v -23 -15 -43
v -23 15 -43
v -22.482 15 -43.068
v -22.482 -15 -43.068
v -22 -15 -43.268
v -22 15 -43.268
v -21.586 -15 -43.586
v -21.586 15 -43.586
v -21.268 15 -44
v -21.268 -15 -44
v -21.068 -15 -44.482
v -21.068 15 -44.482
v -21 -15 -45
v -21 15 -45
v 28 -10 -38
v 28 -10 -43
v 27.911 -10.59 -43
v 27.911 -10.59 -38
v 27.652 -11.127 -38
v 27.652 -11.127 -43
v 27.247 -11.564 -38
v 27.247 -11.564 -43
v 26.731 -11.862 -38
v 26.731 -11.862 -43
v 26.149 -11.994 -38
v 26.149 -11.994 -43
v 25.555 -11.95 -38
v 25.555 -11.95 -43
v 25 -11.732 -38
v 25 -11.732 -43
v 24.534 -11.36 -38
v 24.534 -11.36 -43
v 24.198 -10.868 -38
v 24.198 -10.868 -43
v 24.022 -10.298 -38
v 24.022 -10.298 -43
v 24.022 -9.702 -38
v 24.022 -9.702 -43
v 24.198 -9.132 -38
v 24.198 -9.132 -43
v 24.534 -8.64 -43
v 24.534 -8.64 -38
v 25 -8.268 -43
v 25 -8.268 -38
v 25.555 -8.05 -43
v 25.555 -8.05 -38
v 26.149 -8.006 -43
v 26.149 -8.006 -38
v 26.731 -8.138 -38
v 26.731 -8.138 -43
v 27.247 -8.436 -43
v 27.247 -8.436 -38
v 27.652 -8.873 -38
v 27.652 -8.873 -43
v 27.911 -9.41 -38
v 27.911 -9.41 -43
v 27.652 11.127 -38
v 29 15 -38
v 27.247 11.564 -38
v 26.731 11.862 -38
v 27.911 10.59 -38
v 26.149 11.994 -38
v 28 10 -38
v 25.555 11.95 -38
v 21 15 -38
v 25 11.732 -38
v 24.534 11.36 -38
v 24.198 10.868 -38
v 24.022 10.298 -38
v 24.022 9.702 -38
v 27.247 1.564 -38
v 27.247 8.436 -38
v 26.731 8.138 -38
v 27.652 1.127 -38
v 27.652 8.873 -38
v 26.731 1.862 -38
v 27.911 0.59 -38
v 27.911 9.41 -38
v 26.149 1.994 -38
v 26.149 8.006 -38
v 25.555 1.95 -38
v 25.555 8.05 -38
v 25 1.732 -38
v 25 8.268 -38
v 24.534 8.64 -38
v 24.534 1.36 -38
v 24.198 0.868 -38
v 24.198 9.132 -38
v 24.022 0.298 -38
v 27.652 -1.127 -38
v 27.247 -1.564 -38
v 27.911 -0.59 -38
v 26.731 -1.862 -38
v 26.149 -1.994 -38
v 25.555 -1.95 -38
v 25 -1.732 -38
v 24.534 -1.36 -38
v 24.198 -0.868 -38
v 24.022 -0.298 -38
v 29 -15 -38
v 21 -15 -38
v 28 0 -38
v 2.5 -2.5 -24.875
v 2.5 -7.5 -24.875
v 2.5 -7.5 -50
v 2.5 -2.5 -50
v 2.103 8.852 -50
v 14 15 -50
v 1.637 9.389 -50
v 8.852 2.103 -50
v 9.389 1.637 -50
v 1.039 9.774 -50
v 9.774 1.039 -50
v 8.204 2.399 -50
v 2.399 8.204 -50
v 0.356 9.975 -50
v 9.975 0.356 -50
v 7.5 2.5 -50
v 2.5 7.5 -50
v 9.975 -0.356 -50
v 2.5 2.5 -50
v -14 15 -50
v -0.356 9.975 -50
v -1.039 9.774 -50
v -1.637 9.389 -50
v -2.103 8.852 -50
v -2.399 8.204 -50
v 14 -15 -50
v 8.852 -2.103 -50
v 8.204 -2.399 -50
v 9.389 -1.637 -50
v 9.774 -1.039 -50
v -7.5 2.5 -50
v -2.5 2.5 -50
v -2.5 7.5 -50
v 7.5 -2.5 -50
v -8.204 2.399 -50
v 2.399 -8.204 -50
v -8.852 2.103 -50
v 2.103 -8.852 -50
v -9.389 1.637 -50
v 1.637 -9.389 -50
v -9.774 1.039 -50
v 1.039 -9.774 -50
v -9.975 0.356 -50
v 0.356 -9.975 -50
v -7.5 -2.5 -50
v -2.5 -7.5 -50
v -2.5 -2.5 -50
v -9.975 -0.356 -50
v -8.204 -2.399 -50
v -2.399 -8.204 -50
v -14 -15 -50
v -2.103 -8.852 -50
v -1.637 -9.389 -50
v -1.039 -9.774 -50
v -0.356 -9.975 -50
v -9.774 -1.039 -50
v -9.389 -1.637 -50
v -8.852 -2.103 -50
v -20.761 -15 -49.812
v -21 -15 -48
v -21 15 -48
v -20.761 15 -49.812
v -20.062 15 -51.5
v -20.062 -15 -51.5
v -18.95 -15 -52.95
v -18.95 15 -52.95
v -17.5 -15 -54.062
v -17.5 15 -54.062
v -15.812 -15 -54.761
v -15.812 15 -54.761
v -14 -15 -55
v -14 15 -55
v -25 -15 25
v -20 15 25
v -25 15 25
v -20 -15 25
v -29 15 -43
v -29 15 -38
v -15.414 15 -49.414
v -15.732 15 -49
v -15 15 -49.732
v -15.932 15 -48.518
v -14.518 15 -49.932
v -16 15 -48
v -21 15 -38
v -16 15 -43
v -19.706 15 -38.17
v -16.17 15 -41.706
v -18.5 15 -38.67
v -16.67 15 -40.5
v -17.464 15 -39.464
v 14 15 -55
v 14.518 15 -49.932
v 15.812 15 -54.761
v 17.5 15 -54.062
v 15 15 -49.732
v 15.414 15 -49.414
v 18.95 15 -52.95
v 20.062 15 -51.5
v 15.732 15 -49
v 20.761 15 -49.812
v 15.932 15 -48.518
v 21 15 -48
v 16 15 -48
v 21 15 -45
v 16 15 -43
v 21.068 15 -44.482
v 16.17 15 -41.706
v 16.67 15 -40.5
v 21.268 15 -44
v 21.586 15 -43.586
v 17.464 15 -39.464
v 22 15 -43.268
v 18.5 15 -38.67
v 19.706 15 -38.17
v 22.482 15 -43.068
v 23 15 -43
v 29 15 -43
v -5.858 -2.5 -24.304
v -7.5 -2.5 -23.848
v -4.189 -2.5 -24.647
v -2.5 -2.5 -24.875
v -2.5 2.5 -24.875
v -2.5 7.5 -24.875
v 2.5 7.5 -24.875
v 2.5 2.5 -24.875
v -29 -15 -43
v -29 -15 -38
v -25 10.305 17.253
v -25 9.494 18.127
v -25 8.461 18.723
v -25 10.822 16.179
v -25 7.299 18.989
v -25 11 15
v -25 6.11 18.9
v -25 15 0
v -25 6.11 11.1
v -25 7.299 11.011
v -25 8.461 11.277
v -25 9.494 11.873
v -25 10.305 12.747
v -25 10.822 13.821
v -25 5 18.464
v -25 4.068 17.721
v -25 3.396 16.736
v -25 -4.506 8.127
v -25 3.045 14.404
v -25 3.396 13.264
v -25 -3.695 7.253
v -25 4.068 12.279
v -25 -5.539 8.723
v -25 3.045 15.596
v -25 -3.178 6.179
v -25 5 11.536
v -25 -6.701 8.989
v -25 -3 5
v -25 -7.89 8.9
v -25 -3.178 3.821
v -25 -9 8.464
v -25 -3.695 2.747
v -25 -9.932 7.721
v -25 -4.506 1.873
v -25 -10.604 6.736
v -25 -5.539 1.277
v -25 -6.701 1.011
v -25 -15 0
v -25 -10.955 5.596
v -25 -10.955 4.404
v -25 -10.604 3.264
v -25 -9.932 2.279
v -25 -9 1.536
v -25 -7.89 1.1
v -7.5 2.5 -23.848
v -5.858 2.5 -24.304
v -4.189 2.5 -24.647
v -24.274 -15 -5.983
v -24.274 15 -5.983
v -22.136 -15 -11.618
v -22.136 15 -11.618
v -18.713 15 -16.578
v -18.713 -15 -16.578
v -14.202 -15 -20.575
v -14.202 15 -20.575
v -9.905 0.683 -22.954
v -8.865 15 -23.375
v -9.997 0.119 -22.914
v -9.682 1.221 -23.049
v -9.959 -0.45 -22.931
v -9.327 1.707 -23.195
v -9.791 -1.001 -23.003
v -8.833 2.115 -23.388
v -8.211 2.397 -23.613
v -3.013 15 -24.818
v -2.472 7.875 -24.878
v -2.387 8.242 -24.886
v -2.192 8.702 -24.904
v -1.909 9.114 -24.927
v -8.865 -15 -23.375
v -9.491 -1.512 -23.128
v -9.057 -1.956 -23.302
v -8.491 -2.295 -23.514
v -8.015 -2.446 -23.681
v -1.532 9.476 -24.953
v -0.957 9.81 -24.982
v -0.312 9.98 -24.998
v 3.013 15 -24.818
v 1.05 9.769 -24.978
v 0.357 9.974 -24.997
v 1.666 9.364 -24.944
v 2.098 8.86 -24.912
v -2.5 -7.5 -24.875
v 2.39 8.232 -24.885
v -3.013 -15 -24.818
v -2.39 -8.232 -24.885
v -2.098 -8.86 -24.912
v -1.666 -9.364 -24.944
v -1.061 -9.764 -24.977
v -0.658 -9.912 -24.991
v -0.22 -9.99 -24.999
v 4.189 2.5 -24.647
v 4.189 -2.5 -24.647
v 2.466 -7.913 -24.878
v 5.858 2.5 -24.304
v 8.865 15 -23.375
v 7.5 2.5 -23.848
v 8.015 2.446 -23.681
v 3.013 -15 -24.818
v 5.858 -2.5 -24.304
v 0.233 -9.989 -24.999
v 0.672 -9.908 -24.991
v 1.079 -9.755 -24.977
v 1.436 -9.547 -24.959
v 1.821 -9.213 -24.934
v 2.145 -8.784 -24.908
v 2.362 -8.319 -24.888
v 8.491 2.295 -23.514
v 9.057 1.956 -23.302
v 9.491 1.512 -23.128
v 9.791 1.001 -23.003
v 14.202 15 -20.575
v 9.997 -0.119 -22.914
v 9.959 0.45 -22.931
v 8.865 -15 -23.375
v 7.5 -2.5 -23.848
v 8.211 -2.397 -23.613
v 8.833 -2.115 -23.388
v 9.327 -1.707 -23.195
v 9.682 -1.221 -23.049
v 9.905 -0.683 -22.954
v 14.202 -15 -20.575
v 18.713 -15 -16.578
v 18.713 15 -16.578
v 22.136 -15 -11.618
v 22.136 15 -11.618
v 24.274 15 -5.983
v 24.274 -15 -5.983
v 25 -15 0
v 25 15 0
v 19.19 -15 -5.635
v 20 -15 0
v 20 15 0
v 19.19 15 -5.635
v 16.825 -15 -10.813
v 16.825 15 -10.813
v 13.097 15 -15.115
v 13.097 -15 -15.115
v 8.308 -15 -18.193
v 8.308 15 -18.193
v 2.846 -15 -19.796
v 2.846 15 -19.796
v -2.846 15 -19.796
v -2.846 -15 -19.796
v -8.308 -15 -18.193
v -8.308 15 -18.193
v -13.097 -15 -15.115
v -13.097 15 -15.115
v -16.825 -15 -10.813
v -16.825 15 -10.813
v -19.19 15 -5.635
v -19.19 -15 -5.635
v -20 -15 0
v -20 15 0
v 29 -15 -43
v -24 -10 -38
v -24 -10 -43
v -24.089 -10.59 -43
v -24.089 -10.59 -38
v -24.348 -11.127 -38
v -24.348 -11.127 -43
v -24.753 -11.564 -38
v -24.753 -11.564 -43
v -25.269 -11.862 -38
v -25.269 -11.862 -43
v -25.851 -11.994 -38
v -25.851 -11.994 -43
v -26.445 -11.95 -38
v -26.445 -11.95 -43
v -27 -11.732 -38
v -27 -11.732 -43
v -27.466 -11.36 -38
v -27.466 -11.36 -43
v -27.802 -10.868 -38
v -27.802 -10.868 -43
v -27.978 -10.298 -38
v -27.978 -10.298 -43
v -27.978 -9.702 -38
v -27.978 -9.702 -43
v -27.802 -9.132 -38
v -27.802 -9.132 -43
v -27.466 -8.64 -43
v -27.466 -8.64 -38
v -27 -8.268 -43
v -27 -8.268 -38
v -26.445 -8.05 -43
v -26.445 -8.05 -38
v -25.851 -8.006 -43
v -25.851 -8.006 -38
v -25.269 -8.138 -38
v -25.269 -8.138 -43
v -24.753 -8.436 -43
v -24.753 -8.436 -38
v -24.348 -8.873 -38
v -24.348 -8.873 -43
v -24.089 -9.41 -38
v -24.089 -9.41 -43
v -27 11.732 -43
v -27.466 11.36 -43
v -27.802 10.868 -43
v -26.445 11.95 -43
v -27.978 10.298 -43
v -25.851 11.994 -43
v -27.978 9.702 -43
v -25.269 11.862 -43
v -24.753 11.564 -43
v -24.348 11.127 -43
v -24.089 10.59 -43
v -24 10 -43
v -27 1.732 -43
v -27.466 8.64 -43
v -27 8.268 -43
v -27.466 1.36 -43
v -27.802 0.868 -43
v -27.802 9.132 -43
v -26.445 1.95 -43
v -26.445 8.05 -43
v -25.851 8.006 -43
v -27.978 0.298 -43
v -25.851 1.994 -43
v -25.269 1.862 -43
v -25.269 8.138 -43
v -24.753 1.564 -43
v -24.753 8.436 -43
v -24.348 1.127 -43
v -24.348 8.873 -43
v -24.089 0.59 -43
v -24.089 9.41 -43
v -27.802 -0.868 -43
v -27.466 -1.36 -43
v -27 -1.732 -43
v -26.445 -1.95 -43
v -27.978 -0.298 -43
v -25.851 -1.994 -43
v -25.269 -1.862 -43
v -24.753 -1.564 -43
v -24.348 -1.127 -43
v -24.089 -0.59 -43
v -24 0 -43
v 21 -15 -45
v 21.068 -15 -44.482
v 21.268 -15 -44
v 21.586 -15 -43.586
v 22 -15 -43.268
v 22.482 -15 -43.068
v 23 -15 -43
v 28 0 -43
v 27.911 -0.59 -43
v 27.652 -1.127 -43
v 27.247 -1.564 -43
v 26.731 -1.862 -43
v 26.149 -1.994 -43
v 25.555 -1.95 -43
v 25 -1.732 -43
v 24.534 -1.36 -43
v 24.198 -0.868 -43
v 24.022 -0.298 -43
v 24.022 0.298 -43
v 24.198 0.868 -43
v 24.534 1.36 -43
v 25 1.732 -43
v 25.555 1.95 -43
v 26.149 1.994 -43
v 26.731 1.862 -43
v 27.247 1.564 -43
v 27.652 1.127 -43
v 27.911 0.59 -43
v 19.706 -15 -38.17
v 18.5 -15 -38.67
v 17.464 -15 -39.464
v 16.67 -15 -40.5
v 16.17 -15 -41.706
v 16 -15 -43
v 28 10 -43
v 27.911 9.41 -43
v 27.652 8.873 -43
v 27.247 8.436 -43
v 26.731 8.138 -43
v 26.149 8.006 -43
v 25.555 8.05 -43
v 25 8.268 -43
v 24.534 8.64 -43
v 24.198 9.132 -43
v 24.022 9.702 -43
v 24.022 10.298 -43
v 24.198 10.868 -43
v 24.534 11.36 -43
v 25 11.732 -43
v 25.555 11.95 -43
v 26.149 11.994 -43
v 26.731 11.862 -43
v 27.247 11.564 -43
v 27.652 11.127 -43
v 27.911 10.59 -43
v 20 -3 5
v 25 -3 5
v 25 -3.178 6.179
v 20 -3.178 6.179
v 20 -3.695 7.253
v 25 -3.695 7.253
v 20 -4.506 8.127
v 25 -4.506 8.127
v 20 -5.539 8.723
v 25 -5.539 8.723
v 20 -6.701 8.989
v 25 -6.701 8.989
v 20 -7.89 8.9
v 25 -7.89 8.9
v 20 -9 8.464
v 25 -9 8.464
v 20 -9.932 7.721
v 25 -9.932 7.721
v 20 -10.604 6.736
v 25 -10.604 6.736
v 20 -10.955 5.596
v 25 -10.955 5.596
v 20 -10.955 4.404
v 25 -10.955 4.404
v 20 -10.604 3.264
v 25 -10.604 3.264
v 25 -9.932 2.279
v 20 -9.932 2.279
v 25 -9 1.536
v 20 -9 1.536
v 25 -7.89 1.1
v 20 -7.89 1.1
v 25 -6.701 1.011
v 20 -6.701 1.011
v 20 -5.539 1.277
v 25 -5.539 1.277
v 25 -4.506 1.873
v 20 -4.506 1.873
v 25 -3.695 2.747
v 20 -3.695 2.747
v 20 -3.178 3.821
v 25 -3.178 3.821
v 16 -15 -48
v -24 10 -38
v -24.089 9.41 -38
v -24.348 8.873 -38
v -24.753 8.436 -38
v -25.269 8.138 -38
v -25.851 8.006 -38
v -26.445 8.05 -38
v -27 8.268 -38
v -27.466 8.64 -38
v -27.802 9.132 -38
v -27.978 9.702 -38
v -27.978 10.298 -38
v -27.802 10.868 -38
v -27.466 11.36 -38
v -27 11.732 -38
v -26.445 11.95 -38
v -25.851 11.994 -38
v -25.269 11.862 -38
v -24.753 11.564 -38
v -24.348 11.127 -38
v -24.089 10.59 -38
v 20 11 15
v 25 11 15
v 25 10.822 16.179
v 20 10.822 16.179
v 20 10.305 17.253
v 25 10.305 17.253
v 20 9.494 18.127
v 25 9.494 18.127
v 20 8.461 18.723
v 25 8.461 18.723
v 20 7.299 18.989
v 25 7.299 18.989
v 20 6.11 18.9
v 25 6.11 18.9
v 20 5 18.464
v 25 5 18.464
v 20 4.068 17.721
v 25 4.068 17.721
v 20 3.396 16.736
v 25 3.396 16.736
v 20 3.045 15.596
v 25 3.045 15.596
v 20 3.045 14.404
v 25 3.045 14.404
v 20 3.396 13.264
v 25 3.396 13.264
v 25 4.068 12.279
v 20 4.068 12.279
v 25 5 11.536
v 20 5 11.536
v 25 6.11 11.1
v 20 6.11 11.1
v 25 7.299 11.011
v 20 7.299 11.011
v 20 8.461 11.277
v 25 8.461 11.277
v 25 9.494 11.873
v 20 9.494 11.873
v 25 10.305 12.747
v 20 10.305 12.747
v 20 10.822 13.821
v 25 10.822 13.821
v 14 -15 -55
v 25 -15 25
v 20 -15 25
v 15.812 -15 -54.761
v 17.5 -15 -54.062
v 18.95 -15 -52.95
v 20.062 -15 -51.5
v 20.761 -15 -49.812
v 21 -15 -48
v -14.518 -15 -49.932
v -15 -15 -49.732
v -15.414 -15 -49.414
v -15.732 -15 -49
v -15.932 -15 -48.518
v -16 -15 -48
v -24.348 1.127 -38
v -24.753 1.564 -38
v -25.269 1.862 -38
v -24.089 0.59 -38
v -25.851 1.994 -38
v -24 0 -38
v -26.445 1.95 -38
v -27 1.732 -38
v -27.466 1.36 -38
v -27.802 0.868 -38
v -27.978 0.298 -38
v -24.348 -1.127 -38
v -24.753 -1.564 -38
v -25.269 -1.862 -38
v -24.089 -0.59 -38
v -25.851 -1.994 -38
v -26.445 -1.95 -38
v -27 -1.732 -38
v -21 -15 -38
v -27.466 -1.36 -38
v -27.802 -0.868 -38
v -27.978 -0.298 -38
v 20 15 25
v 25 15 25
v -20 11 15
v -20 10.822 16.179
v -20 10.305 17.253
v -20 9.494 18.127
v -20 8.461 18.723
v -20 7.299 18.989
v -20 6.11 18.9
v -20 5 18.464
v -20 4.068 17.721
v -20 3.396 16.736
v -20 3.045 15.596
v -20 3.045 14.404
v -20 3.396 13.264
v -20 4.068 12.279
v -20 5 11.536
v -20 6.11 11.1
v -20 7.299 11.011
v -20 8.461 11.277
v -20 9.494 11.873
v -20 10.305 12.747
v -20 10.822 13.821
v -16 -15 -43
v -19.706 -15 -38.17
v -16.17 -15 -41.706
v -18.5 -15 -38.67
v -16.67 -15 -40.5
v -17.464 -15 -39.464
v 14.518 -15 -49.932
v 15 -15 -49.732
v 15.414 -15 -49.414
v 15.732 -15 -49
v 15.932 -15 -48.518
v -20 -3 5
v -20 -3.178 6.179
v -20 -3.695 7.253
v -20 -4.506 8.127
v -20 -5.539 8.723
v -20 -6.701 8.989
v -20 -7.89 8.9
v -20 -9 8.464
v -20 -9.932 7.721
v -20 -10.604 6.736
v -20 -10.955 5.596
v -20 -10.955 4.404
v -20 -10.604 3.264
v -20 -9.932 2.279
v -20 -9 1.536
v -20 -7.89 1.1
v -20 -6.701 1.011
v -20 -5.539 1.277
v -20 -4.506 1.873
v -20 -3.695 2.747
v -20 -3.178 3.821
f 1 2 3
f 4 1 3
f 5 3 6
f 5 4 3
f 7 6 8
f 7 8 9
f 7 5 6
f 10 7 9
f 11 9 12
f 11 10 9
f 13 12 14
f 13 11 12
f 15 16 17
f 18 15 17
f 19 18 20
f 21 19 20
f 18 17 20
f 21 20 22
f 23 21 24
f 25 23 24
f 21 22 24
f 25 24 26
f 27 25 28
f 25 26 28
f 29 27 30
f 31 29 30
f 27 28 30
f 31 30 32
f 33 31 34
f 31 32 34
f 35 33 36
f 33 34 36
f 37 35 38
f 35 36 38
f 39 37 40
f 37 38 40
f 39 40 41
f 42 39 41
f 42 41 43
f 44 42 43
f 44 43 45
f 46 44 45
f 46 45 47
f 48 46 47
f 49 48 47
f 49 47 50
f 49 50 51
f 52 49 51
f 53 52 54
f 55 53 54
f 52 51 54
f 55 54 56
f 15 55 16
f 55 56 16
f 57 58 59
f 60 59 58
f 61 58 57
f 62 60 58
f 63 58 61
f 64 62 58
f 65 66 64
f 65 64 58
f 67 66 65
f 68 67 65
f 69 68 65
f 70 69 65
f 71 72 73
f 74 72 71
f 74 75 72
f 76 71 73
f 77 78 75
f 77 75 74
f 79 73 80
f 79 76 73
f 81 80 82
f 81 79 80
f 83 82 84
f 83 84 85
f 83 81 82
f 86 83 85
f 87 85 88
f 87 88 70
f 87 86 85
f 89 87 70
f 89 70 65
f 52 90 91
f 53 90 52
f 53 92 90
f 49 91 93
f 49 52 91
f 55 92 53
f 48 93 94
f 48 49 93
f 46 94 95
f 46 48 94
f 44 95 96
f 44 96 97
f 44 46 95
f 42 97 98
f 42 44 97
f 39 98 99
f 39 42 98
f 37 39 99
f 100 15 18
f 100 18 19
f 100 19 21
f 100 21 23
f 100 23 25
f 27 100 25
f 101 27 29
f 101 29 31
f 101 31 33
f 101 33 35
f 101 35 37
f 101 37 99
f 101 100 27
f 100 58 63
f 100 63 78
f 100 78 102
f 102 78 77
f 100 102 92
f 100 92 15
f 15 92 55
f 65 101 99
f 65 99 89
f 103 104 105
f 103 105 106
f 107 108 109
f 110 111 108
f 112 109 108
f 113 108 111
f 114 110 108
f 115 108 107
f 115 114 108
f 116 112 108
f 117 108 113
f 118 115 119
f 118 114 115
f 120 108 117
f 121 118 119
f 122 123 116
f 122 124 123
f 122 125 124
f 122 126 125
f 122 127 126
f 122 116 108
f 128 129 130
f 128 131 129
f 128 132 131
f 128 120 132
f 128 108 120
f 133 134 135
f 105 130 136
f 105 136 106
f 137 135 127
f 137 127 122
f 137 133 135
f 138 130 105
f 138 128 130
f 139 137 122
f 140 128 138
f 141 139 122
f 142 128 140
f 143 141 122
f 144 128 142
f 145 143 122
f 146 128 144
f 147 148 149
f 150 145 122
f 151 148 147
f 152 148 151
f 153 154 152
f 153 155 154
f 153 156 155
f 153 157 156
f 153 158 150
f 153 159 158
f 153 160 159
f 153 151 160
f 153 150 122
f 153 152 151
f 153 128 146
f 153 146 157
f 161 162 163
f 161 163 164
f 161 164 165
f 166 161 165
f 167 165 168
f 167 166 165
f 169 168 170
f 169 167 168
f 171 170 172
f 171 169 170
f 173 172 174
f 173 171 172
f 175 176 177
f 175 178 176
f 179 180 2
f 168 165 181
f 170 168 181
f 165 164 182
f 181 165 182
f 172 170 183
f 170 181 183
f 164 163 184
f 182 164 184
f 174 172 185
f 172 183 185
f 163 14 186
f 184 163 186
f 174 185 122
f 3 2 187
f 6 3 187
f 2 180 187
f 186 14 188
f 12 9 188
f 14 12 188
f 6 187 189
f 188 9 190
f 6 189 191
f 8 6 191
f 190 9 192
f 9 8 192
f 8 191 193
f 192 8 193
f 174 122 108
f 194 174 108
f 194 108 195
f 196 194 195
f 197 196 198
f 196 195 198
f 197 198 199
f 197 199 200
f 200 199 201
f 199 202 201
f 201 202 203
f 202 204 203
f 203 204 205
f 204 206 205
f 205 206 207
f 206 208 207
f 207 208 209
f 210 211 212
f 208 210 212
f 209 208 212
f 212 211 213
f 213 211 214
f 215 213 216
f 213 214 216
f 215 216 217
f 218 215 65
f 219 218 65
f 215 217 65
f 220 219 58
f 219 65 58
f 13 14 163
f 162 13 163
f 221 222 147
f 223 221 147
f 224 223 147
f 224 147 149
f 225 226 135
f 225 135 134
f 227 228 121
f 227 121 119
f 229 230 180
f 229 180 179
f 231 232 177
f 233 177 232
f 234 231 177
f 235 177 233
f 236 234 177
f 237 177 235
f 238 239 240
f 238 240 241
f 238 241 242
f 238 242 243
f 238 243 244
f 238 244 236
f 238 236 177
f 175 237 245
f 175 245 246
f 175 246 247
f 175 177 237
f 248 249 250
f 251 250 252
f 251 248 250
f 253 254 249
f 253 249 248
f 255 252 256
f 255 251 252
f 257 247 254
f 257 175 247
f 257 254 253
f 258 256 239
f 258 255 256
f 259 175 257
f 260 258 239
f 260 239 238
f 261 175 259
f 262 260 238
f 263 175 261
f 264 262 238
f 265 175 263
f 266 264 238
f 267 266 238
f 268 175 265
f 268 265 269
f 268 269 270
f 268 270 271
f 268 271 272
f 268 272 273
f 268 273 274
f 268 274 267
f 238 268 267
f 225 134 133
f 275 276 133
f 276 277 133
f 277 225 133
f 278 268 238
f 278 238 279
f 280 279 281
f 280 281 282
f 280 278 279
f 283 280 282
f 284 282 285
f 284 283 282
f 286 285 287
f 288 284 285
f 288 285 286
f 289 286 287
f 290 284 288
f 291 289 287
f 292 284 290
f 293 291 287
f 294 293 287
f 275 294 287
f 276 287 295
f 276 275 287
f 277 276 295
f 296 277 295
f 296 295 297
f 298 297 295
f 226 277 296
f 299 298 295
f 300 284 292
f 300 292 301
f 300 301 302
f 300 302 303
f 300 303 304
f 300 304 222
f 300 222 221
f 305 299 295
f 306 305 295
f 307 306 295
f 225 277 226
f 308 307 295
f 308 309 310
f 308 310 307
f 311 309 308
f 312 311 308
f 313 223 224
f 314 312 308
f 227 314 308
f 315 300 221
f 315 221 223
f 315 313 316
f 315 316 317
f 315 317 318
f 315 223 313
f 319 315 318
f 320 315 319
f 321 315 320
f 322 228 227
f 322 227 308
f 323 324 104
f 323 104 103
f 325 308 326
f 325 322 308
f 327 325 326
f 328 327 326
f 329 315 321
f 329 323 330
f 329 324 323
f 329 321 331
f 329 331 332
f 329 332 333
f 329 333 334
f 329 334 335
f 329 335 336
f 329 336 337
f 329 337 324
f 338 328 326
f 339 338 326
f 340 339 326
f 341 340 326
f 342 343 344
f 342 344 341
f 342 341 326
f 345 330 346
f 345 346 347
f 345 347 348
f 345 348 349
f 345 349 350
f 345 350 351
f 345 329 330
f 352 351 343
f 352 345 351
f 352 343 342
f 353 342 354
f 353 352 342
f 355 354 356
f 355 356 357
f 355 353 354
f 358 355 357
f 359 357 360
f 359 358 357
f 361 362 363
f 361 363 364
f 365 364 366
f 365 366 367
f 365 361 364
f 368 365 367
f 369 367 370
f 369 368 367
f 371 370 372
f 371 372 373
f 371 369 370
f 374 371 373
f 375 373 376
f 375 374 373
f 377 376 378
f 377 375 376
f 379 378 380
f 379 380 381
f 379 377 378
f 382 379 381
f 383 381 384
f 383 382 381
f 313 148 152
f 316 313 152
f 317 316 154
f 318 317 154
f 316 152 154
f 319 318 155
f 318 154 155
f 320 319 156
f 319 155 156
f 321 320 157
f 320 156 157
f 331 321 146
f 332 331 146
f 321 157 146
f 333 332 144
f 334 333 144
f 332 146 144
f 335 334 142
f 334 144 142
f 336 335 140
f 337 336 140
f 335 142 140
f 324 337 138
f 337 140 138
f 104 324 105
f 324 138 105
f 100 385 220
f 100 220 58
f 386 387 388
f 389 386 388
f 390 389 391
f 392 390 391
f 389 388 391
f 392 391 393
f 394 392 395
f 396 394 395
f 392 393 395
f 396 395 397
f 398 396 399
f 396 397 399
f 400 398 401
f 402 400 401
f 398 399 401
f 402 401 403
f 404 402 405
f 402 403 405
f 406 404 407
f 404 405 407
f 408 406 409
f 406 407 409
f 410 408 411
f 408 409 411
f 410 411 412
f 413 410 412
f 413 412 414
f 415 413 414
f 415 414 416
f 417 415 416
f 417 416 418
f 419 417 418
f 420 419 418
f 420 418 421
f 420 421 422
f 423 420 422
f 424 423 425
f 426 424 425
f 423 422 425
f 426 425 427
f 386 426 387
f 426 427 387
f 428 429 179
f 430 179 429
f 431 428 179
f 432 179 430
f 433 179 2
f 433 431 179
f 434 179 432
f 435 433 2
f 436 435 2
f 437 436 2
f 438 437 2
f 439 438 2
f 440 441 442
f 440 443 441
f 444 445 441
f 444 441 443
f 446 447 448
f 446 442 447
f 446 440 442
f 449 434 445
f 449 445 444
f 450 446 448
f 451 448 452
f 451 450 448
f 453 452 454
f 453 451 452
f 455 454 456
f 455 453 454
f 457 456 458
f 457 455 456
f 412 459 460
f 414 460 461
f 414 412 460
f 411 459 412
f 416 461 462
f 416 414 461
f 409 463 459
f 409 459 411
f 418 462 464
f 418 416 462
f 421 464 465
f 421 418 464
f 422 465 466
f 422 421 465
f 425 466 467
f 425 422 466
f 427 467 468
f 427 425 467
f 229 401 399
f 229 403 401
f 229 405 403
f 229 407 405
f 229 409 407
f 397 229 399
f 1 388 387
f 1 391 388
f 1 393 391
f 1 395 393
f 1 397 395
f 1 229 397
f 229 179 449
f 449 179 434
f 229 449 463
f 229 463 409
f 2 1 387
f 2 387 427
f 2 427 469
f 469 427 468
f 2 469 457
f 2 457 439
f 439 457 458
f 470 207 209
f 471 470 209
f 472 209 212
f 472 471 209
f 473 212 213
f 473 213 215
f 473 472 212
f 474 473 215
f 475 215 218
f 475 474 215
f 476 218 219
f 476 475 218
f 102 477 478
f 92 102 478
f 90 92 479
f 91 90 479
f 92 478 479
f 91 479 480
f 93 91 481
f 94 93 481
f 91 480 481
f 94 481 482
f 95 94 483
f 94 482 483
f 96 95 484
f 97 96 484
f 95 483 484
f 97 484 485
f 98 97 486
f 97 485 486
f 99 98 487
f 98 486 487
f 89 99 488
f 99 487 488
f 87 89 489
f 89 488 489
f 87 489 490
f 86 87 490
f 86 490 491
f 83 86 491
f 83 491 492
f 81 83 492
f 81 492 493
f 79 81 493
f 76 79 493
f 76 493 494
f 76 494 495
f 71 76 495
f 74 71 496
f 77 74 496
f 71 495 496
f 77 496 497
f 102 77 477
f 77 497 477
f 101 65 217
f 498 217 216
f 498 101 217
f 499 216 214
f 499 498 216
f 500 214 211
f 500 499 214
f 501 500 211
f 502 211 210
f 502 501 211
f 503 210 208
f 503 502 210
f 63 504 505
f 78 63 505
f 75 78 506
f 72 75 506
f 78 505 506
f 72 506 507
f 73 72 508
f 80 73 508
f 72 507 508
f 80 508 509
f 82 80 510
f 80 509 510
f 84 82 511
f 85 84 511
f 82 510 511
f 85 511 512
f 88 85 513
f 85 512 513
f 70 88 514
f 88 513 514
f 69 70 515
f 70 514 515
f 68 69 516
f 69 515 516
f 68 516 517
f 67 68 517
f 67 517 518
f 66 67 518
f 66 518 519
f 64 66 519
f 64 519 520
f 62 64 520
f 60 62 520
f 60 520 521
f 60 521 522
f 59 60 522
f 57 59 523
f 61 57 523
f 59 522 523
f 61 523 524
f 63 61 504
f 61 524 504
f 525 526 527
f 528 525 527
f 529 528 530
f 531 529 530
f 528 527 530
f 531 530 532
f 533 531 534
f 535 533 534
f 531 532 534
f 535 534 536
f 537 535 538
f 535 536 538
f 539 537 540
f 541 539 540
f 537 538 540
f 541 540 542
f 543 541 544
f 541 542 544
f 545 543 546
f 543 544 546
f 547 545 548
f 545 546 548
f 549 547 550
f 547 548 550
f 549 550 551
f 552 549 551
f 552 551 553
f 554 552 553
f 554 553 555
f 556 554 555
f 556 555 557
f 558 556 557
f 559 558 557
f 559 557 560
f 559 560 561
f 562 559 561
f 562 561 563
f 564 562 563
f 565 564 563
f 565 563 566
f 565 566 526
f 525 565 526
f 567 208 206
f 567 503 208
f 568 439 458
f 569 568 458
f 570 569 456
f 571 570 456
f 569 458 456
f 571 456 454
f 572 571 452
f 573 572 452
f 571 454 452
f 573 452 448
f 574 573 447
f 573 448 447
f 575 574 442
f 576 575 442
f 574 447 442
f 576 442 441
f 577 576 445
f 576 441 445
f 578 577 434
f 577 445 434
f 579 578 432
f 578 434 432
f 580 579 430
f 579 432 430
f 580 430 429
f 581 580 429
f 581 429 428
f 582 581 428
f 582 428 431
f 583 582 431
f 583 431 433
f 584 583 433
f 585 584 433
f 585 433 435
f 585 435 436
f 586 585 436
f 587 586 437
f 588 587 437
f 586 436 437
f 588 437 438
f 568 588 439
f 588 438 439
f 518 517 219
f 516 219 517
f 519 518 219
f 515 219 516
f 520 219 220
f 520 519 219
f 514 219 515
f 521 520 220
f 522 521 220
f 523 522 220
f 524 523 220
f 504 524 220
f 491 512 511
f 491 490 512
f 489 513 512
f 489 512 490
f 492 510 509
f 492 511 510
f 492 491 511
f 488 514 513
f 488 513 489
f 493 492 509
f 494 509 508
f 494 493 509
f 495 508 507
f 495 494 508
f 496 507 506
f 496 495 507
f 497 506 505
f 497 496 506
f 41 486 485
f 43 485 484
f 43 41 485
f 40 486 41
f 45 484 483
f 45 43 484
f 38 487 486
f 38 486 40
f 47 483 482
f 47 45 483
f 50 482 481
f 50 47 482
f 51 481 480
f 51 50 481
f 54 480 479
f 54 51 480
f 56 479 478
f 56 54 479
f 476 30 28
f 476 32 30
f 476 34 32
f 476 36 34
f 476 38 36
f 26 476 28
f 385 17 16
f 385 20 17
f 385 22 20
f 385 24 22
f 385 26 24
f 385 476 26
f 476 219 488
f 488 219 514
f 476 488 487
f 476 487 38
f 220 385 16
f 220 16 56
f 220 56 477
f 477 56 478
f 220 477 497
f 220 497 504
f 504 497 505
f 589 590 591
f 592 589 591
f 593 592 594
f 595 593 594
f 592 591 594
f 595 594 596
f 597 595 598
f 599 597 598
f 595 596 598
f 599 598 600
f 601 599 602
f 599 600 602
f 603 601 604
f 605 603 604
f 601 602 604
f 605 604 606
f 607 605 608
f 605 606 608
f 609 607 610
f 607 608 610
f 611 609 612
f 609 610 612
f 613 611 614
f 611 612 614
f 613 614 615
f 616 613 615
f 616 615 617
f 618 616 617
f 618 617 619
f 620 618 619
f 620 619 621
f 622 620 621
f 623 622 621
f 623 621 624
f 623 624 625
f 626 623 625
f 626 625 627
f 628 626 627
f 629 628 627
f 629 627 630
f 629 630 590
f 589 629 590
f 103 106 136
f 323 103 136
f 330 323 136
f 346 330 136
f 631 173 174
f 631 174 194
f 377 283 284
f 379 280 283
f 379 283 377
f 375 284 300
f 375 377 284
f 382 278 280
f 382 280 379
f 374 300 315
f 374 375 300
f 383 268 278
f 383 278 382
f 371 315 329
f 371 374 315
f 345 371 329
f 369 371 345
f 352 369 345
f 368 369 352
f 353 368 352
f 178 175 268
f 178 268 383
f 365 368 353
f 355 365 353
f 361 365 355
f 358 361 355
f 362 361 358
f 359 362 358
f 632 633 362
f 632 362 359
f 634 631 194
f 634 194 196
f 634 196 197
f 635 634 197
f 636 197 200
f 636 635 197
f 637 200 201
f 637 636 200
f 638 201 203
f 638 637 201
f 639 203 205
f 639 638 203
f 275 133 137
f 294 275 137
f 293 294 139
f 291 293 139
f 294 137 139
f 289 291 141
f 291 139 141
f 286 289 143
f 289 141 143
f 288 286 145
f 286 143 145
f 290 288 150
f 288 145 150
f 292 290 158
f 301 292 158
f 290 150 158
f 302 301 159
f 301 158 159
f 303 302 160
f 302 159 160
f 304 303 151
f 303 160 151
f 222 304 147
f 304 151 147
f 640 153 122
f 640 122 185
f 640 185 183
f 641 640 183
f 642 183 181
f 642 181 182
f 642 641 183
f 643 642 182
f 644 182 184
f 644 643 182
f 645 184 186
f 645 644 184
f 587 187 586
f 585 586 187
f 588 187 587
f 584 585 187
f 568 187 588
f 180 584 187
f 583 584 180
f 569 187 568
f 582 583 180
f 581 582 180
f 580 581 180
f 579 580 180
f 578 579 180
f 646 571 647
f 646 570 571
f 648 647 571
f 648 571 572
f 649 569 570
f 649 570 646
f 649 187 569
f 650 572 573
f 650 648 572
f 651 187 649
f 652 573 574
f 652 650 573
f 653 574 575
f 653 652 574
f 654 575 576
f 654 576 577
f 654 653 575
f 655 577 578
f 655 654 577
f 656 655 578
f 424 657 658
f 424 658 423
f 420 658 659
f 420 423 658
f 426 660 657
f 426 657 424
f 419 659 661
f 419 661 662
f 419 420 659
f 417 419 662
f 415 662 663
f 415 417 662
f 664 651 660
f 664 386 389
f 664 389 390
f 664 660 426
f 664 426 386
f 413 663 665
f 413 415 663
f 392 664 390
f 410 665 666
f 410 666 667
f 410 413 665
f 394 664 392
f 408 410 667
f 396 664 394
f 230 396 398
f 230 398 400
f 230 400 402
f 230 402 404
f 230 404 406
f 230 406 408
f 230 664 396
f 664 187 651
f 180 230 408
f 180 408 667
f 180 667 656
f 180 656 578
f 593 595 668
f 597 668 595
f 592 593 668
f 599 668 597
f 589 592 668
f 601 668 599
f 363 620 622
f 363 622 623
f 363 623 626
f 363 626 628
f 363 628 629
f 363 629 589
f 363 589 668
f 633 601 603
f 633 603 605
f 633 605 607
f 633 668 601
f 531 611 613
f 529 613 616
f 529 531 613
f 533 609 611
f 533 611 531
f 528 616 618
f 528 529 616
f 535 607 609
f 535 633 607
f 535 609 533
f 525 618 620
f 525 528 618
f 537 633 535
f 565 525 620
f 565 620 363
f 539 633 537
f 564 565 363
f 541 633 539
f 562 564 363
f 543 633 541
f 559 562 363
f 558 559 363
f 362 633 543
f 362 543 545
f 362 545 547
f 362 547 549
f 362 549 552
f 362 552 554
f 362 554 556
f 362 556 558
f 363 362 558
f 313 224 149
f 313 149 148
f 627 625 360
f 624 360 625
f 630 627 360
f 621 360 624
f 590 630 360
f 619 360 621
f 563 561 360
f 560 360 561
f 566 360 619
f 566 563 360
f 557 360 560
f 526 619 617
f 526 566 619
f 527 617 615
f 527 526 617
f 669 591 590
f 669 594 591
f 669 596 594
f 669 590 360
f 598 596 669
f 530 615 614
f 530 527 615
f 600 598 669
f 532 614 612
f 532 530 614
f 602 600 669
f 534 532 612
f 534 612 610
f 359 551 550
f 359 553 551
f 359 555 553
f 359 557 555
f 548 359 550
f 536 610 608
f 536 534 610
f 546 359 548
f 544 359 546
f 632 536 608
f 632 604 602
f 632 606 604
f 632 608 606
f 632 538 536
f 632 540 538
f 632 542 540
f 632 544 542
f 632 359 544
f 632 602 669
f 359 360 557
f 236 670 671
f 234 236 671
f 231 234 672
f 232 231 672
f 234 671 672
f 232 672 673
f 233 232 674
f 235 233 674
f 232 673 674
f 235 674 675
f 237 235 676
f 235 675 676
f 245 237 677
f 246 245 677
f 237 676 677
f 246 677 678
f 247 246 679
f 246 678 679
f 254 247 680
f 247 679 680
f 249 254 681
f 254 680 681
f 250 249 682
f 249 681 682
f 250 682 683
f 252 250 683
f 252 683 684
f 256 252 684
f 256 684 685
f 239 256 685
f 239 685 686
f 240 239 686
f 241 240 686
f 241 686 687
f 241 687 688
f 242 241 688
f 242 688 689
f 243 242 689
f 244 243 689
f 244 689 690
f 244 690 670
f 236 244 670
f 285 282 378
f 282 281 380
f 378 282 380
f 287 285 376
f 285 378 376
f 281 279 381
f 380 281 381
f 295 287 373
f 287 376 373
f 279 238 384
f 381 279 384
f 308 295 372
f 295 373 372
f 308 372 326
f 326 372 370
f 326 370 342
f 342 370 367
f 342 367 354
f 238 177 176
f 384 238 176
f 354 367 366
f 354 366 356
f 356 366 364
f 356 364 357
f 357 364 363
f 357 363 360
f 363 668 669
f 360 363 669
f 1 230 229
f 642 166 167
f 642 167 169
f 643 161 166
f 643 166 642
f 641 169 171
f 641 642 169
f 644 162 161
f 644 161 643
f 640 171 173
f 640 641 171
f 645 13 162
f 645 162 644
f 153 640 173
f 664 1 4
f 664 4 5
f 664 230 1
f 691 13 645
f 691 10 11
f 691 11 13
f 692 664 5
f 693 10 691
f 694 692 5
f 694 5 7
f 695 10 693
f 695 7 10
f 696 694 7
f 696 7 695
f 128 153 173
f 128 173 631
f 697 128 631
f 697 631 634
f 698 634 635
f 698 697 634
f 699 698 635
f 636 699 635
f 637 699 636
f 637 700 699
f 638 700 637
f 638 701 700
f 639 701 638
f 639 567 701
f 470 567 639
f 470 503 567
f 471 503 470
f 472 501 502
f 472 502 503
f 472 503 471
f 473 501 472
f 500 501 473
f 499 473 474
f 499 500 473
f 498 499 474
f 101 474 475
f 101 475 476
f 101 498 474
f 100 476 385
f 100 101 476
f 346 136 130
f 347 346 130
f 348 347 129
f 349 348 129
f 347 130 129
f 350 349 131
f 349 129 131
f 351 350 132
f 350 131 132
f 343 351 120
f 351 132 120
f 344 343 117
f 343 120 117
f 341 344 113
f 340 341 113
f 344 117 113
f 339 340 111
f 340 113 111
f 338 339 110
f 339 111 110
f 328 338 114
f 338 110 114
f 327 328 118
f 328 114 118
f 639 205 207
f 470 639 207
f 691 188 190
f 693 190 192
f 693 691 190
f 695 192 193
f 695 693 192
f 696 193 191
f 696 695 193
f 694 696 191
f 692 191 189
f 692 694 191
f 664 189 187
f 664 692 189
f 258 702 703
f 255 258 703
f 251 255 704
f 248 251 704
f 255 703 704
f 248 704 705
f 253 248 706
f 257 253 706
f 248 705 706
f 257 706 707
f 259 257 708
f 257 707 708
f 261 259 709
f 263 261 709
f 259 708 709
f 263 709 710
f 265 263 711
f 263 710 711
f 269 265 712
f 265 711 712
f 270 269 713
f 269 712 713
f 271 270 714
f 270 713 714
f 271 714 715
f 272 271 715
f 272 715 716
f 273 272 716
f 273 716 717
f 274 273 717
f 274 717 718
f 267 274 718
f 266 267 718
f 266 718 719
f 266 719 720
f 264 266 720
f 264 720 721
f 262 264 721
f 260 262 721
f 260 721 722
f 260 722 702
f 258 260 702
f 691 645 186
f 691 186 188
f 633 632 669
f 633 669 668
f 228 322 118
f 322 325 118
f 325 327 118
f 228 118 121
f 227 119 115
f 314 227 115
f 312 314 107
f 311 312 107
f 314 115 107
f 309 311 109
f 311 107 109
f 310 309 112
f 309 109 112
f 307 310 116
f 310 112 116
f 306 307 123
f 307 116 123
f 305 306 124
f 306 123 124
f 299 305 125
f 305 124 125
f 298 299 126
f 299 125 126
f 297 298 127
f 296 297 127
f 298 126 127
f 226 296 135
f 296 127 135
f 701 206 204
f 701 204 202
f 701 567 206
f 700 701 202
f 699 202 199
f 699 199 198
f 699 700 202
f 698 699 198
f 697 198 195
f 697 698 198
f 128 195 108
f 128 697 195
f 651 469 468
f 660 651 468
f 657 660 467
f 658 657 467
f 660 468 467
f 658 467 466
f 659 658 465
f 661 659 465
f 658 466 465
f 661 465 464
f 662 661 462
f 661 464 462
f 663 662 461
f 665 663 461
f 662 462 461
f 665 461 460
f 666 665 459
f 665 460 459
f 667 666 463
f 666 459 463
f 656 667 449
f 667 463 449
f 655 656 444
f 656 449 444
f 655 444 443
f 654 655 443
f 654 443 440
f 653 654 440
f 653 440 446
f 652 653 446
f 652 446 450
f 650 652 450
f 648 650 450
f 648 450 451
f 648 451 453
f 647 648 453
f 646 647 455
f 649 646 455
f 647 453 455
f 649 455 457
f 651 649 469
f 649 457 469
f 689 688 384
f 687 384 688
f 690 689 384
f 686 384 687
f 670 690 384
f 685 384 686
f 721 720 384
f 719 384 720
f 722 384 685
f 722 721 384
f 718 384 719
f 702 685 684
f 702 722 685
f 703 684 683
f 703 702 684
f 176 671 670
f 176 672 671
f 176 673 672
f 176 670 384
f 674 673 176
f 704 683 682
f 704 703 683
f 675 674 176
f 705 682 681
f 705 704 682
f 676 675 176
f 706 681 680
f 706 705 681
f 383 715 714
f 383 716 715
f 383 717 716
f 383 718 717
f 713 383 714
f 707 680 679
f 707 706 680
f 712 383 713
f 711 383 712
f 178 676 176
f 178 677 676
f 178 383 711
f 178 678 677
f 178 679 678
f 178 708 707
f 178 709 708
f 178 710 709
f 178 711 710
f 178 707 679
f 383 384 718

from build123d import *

# Parameters (mm, degrees)
F1_DEPTH = 15
F3_DEPTH = 28.0871216252
F4_R     = 2
F5_DEPTH = 5
F6_R     = 4
F7_DEPTH = 54.001


with BuildPart() as f1:
    # F0 (on Front) → F1 (new body, symmetric)
    with BuildSketch(Plane.XZ):
        with BuildLine():
            Line((-25, 25), (-25, 0))
            ThreePointArc((-25, 0), (0, -25), (25, 0))
            Line((25, 0), (25, 25))
            Line((25, 25), (20, 25))
            Line((20, 25), (20, 0))
            ThreePointArc((20, 0), (0, -20), (-20, 0))
            Line((-20, 0), (-20, 25))
            Line((-20, 25), (-25, 25))
        make_face()
    extrude(amount=F1_DEPTH, both=True)



with BuildPart() as f1b:
    # F0 (on Front) → F1, piece 2 (new body, symmetric)
    with BuildSketch(Plane.XZ):
        with BuildLine():
            Line((14, -50), (0, -50))
            Line((0, -50), (-14, -50))
            ThreePointArc((-14, -50), (-15.4142135624, -49.4142135624), (-16, -48))
            Line((-16, -48), (-16, -43))
            ThreePointArc((-16, -43), (-17.4644660941, -39.4644660941), (-21, -38))
            Line((-21, -38), (-29, -38))
            Line((-29, -38), (-29, -43))
            Line((-29, -43), (-23, -43))
            ThreePointArc((-23, -43), (-21.5857864376, -43.5857864376), (-21, -45))
            Line((-21, -45), (-21, -48))
            ThreePointArc((-21, -48), (-18.9497474683, -52.9497474683), (-14, -55))
            Line((-14, -55), (14, -55))
            ThreePointArc((14, -55), (18.9497474683, -52.9497474683), (21, -48))
            Line((21, -48), (21, -45))
            ThreePointArc((21, -45), (21.5857864376, -43.5857864376), (23, -43))
            Line((23, -43), (29, -43))
            Line((29, -43), (29, -38))
            Line((29, -38), (21, -38))
            ThreePointArc((21, -38), (17.4644660941, -39.4644660941), (16, -43))
            Line((16, -43), (16, -48))
            ThreePointArc((16, -48), (15.4142135624, -49.4142135624), (14, -50))
        make_face()
    extrude(amount=F1_DEPTH, both=True)


with BuildPart() as f1_1:
    add(f1.part)

    add(f1b.part)  # F3 merges F1b
    # F2 (on face) → F3 (join, up to face)
    with BuildSketch(Plane.XY.offset(-50)):
        with BuildLine():
            ThreePointArc((7.5, -2.5), (10, 0), (7.5, 2.5))
            Line((7.5, 2.5), (2.5, 2.5))
            Line((2.5, 2.5), (2.5, 7.5))
            ThreePointArc((2.5, 7.5), (0, 10), (-2.5, 7.5))
            Line((-2.5, 7.5), (-2.5, 2.5))
            Line((-2.5, 2.5), (-7.5, 2.5))
            ThreePointArc((-7.5, 2.5), (-10, 0), (-7.5, -2.5))
            Line((-7.5, -2.5), (-2.5, -2.5))
            Line((-2.5, -2.5), (-2.5, -7.5))
            ThreePointArc((-2.5, -7.5), (0, -10), (2.5, -7.5))
            Line((2.5, -7.5), (2.5, -2.5))
            Line((2.5, -2.5), (7.5, -2.5))
        make_face()
    extrude(amount=F3_DEPTH)

    # F4 (on face) → F5 (cut, through all)
    with BuildSketch(Plane(origin=(0, 0, -43), x_dir=(1, 0, 0), z_dir=(0, 0, -1))):
        with Locations((-26, -10)):
            Circle(F4_R)
        with Locations((-26, 0)):
            Circle(F4_R)
        with Locations((-26, 10)):
            Circle(F4_R)
        with Locations((26, -10)):
            Circle(F4_R)
        with Locations((26, 0)):
            Circle(F4_R)
        with Locations((26, 10)):
            Circle(F4_R)
    extrude(amount=-F5_DEPTH, mode=Mode.SUBTRACT)

    # F6 (on face) → F7 (cut, through all)
    with BuildSketch(Plane.YZ.offset(25)):
        with Locations((-7, 5)):
            Circle(F6_R)
        with Locations((7, 15)):
            Circle(F6_R)
    extrude(amount=-F7_DEPTH, mode=Mode.SUBTRACT)


solid = f1_1.part
